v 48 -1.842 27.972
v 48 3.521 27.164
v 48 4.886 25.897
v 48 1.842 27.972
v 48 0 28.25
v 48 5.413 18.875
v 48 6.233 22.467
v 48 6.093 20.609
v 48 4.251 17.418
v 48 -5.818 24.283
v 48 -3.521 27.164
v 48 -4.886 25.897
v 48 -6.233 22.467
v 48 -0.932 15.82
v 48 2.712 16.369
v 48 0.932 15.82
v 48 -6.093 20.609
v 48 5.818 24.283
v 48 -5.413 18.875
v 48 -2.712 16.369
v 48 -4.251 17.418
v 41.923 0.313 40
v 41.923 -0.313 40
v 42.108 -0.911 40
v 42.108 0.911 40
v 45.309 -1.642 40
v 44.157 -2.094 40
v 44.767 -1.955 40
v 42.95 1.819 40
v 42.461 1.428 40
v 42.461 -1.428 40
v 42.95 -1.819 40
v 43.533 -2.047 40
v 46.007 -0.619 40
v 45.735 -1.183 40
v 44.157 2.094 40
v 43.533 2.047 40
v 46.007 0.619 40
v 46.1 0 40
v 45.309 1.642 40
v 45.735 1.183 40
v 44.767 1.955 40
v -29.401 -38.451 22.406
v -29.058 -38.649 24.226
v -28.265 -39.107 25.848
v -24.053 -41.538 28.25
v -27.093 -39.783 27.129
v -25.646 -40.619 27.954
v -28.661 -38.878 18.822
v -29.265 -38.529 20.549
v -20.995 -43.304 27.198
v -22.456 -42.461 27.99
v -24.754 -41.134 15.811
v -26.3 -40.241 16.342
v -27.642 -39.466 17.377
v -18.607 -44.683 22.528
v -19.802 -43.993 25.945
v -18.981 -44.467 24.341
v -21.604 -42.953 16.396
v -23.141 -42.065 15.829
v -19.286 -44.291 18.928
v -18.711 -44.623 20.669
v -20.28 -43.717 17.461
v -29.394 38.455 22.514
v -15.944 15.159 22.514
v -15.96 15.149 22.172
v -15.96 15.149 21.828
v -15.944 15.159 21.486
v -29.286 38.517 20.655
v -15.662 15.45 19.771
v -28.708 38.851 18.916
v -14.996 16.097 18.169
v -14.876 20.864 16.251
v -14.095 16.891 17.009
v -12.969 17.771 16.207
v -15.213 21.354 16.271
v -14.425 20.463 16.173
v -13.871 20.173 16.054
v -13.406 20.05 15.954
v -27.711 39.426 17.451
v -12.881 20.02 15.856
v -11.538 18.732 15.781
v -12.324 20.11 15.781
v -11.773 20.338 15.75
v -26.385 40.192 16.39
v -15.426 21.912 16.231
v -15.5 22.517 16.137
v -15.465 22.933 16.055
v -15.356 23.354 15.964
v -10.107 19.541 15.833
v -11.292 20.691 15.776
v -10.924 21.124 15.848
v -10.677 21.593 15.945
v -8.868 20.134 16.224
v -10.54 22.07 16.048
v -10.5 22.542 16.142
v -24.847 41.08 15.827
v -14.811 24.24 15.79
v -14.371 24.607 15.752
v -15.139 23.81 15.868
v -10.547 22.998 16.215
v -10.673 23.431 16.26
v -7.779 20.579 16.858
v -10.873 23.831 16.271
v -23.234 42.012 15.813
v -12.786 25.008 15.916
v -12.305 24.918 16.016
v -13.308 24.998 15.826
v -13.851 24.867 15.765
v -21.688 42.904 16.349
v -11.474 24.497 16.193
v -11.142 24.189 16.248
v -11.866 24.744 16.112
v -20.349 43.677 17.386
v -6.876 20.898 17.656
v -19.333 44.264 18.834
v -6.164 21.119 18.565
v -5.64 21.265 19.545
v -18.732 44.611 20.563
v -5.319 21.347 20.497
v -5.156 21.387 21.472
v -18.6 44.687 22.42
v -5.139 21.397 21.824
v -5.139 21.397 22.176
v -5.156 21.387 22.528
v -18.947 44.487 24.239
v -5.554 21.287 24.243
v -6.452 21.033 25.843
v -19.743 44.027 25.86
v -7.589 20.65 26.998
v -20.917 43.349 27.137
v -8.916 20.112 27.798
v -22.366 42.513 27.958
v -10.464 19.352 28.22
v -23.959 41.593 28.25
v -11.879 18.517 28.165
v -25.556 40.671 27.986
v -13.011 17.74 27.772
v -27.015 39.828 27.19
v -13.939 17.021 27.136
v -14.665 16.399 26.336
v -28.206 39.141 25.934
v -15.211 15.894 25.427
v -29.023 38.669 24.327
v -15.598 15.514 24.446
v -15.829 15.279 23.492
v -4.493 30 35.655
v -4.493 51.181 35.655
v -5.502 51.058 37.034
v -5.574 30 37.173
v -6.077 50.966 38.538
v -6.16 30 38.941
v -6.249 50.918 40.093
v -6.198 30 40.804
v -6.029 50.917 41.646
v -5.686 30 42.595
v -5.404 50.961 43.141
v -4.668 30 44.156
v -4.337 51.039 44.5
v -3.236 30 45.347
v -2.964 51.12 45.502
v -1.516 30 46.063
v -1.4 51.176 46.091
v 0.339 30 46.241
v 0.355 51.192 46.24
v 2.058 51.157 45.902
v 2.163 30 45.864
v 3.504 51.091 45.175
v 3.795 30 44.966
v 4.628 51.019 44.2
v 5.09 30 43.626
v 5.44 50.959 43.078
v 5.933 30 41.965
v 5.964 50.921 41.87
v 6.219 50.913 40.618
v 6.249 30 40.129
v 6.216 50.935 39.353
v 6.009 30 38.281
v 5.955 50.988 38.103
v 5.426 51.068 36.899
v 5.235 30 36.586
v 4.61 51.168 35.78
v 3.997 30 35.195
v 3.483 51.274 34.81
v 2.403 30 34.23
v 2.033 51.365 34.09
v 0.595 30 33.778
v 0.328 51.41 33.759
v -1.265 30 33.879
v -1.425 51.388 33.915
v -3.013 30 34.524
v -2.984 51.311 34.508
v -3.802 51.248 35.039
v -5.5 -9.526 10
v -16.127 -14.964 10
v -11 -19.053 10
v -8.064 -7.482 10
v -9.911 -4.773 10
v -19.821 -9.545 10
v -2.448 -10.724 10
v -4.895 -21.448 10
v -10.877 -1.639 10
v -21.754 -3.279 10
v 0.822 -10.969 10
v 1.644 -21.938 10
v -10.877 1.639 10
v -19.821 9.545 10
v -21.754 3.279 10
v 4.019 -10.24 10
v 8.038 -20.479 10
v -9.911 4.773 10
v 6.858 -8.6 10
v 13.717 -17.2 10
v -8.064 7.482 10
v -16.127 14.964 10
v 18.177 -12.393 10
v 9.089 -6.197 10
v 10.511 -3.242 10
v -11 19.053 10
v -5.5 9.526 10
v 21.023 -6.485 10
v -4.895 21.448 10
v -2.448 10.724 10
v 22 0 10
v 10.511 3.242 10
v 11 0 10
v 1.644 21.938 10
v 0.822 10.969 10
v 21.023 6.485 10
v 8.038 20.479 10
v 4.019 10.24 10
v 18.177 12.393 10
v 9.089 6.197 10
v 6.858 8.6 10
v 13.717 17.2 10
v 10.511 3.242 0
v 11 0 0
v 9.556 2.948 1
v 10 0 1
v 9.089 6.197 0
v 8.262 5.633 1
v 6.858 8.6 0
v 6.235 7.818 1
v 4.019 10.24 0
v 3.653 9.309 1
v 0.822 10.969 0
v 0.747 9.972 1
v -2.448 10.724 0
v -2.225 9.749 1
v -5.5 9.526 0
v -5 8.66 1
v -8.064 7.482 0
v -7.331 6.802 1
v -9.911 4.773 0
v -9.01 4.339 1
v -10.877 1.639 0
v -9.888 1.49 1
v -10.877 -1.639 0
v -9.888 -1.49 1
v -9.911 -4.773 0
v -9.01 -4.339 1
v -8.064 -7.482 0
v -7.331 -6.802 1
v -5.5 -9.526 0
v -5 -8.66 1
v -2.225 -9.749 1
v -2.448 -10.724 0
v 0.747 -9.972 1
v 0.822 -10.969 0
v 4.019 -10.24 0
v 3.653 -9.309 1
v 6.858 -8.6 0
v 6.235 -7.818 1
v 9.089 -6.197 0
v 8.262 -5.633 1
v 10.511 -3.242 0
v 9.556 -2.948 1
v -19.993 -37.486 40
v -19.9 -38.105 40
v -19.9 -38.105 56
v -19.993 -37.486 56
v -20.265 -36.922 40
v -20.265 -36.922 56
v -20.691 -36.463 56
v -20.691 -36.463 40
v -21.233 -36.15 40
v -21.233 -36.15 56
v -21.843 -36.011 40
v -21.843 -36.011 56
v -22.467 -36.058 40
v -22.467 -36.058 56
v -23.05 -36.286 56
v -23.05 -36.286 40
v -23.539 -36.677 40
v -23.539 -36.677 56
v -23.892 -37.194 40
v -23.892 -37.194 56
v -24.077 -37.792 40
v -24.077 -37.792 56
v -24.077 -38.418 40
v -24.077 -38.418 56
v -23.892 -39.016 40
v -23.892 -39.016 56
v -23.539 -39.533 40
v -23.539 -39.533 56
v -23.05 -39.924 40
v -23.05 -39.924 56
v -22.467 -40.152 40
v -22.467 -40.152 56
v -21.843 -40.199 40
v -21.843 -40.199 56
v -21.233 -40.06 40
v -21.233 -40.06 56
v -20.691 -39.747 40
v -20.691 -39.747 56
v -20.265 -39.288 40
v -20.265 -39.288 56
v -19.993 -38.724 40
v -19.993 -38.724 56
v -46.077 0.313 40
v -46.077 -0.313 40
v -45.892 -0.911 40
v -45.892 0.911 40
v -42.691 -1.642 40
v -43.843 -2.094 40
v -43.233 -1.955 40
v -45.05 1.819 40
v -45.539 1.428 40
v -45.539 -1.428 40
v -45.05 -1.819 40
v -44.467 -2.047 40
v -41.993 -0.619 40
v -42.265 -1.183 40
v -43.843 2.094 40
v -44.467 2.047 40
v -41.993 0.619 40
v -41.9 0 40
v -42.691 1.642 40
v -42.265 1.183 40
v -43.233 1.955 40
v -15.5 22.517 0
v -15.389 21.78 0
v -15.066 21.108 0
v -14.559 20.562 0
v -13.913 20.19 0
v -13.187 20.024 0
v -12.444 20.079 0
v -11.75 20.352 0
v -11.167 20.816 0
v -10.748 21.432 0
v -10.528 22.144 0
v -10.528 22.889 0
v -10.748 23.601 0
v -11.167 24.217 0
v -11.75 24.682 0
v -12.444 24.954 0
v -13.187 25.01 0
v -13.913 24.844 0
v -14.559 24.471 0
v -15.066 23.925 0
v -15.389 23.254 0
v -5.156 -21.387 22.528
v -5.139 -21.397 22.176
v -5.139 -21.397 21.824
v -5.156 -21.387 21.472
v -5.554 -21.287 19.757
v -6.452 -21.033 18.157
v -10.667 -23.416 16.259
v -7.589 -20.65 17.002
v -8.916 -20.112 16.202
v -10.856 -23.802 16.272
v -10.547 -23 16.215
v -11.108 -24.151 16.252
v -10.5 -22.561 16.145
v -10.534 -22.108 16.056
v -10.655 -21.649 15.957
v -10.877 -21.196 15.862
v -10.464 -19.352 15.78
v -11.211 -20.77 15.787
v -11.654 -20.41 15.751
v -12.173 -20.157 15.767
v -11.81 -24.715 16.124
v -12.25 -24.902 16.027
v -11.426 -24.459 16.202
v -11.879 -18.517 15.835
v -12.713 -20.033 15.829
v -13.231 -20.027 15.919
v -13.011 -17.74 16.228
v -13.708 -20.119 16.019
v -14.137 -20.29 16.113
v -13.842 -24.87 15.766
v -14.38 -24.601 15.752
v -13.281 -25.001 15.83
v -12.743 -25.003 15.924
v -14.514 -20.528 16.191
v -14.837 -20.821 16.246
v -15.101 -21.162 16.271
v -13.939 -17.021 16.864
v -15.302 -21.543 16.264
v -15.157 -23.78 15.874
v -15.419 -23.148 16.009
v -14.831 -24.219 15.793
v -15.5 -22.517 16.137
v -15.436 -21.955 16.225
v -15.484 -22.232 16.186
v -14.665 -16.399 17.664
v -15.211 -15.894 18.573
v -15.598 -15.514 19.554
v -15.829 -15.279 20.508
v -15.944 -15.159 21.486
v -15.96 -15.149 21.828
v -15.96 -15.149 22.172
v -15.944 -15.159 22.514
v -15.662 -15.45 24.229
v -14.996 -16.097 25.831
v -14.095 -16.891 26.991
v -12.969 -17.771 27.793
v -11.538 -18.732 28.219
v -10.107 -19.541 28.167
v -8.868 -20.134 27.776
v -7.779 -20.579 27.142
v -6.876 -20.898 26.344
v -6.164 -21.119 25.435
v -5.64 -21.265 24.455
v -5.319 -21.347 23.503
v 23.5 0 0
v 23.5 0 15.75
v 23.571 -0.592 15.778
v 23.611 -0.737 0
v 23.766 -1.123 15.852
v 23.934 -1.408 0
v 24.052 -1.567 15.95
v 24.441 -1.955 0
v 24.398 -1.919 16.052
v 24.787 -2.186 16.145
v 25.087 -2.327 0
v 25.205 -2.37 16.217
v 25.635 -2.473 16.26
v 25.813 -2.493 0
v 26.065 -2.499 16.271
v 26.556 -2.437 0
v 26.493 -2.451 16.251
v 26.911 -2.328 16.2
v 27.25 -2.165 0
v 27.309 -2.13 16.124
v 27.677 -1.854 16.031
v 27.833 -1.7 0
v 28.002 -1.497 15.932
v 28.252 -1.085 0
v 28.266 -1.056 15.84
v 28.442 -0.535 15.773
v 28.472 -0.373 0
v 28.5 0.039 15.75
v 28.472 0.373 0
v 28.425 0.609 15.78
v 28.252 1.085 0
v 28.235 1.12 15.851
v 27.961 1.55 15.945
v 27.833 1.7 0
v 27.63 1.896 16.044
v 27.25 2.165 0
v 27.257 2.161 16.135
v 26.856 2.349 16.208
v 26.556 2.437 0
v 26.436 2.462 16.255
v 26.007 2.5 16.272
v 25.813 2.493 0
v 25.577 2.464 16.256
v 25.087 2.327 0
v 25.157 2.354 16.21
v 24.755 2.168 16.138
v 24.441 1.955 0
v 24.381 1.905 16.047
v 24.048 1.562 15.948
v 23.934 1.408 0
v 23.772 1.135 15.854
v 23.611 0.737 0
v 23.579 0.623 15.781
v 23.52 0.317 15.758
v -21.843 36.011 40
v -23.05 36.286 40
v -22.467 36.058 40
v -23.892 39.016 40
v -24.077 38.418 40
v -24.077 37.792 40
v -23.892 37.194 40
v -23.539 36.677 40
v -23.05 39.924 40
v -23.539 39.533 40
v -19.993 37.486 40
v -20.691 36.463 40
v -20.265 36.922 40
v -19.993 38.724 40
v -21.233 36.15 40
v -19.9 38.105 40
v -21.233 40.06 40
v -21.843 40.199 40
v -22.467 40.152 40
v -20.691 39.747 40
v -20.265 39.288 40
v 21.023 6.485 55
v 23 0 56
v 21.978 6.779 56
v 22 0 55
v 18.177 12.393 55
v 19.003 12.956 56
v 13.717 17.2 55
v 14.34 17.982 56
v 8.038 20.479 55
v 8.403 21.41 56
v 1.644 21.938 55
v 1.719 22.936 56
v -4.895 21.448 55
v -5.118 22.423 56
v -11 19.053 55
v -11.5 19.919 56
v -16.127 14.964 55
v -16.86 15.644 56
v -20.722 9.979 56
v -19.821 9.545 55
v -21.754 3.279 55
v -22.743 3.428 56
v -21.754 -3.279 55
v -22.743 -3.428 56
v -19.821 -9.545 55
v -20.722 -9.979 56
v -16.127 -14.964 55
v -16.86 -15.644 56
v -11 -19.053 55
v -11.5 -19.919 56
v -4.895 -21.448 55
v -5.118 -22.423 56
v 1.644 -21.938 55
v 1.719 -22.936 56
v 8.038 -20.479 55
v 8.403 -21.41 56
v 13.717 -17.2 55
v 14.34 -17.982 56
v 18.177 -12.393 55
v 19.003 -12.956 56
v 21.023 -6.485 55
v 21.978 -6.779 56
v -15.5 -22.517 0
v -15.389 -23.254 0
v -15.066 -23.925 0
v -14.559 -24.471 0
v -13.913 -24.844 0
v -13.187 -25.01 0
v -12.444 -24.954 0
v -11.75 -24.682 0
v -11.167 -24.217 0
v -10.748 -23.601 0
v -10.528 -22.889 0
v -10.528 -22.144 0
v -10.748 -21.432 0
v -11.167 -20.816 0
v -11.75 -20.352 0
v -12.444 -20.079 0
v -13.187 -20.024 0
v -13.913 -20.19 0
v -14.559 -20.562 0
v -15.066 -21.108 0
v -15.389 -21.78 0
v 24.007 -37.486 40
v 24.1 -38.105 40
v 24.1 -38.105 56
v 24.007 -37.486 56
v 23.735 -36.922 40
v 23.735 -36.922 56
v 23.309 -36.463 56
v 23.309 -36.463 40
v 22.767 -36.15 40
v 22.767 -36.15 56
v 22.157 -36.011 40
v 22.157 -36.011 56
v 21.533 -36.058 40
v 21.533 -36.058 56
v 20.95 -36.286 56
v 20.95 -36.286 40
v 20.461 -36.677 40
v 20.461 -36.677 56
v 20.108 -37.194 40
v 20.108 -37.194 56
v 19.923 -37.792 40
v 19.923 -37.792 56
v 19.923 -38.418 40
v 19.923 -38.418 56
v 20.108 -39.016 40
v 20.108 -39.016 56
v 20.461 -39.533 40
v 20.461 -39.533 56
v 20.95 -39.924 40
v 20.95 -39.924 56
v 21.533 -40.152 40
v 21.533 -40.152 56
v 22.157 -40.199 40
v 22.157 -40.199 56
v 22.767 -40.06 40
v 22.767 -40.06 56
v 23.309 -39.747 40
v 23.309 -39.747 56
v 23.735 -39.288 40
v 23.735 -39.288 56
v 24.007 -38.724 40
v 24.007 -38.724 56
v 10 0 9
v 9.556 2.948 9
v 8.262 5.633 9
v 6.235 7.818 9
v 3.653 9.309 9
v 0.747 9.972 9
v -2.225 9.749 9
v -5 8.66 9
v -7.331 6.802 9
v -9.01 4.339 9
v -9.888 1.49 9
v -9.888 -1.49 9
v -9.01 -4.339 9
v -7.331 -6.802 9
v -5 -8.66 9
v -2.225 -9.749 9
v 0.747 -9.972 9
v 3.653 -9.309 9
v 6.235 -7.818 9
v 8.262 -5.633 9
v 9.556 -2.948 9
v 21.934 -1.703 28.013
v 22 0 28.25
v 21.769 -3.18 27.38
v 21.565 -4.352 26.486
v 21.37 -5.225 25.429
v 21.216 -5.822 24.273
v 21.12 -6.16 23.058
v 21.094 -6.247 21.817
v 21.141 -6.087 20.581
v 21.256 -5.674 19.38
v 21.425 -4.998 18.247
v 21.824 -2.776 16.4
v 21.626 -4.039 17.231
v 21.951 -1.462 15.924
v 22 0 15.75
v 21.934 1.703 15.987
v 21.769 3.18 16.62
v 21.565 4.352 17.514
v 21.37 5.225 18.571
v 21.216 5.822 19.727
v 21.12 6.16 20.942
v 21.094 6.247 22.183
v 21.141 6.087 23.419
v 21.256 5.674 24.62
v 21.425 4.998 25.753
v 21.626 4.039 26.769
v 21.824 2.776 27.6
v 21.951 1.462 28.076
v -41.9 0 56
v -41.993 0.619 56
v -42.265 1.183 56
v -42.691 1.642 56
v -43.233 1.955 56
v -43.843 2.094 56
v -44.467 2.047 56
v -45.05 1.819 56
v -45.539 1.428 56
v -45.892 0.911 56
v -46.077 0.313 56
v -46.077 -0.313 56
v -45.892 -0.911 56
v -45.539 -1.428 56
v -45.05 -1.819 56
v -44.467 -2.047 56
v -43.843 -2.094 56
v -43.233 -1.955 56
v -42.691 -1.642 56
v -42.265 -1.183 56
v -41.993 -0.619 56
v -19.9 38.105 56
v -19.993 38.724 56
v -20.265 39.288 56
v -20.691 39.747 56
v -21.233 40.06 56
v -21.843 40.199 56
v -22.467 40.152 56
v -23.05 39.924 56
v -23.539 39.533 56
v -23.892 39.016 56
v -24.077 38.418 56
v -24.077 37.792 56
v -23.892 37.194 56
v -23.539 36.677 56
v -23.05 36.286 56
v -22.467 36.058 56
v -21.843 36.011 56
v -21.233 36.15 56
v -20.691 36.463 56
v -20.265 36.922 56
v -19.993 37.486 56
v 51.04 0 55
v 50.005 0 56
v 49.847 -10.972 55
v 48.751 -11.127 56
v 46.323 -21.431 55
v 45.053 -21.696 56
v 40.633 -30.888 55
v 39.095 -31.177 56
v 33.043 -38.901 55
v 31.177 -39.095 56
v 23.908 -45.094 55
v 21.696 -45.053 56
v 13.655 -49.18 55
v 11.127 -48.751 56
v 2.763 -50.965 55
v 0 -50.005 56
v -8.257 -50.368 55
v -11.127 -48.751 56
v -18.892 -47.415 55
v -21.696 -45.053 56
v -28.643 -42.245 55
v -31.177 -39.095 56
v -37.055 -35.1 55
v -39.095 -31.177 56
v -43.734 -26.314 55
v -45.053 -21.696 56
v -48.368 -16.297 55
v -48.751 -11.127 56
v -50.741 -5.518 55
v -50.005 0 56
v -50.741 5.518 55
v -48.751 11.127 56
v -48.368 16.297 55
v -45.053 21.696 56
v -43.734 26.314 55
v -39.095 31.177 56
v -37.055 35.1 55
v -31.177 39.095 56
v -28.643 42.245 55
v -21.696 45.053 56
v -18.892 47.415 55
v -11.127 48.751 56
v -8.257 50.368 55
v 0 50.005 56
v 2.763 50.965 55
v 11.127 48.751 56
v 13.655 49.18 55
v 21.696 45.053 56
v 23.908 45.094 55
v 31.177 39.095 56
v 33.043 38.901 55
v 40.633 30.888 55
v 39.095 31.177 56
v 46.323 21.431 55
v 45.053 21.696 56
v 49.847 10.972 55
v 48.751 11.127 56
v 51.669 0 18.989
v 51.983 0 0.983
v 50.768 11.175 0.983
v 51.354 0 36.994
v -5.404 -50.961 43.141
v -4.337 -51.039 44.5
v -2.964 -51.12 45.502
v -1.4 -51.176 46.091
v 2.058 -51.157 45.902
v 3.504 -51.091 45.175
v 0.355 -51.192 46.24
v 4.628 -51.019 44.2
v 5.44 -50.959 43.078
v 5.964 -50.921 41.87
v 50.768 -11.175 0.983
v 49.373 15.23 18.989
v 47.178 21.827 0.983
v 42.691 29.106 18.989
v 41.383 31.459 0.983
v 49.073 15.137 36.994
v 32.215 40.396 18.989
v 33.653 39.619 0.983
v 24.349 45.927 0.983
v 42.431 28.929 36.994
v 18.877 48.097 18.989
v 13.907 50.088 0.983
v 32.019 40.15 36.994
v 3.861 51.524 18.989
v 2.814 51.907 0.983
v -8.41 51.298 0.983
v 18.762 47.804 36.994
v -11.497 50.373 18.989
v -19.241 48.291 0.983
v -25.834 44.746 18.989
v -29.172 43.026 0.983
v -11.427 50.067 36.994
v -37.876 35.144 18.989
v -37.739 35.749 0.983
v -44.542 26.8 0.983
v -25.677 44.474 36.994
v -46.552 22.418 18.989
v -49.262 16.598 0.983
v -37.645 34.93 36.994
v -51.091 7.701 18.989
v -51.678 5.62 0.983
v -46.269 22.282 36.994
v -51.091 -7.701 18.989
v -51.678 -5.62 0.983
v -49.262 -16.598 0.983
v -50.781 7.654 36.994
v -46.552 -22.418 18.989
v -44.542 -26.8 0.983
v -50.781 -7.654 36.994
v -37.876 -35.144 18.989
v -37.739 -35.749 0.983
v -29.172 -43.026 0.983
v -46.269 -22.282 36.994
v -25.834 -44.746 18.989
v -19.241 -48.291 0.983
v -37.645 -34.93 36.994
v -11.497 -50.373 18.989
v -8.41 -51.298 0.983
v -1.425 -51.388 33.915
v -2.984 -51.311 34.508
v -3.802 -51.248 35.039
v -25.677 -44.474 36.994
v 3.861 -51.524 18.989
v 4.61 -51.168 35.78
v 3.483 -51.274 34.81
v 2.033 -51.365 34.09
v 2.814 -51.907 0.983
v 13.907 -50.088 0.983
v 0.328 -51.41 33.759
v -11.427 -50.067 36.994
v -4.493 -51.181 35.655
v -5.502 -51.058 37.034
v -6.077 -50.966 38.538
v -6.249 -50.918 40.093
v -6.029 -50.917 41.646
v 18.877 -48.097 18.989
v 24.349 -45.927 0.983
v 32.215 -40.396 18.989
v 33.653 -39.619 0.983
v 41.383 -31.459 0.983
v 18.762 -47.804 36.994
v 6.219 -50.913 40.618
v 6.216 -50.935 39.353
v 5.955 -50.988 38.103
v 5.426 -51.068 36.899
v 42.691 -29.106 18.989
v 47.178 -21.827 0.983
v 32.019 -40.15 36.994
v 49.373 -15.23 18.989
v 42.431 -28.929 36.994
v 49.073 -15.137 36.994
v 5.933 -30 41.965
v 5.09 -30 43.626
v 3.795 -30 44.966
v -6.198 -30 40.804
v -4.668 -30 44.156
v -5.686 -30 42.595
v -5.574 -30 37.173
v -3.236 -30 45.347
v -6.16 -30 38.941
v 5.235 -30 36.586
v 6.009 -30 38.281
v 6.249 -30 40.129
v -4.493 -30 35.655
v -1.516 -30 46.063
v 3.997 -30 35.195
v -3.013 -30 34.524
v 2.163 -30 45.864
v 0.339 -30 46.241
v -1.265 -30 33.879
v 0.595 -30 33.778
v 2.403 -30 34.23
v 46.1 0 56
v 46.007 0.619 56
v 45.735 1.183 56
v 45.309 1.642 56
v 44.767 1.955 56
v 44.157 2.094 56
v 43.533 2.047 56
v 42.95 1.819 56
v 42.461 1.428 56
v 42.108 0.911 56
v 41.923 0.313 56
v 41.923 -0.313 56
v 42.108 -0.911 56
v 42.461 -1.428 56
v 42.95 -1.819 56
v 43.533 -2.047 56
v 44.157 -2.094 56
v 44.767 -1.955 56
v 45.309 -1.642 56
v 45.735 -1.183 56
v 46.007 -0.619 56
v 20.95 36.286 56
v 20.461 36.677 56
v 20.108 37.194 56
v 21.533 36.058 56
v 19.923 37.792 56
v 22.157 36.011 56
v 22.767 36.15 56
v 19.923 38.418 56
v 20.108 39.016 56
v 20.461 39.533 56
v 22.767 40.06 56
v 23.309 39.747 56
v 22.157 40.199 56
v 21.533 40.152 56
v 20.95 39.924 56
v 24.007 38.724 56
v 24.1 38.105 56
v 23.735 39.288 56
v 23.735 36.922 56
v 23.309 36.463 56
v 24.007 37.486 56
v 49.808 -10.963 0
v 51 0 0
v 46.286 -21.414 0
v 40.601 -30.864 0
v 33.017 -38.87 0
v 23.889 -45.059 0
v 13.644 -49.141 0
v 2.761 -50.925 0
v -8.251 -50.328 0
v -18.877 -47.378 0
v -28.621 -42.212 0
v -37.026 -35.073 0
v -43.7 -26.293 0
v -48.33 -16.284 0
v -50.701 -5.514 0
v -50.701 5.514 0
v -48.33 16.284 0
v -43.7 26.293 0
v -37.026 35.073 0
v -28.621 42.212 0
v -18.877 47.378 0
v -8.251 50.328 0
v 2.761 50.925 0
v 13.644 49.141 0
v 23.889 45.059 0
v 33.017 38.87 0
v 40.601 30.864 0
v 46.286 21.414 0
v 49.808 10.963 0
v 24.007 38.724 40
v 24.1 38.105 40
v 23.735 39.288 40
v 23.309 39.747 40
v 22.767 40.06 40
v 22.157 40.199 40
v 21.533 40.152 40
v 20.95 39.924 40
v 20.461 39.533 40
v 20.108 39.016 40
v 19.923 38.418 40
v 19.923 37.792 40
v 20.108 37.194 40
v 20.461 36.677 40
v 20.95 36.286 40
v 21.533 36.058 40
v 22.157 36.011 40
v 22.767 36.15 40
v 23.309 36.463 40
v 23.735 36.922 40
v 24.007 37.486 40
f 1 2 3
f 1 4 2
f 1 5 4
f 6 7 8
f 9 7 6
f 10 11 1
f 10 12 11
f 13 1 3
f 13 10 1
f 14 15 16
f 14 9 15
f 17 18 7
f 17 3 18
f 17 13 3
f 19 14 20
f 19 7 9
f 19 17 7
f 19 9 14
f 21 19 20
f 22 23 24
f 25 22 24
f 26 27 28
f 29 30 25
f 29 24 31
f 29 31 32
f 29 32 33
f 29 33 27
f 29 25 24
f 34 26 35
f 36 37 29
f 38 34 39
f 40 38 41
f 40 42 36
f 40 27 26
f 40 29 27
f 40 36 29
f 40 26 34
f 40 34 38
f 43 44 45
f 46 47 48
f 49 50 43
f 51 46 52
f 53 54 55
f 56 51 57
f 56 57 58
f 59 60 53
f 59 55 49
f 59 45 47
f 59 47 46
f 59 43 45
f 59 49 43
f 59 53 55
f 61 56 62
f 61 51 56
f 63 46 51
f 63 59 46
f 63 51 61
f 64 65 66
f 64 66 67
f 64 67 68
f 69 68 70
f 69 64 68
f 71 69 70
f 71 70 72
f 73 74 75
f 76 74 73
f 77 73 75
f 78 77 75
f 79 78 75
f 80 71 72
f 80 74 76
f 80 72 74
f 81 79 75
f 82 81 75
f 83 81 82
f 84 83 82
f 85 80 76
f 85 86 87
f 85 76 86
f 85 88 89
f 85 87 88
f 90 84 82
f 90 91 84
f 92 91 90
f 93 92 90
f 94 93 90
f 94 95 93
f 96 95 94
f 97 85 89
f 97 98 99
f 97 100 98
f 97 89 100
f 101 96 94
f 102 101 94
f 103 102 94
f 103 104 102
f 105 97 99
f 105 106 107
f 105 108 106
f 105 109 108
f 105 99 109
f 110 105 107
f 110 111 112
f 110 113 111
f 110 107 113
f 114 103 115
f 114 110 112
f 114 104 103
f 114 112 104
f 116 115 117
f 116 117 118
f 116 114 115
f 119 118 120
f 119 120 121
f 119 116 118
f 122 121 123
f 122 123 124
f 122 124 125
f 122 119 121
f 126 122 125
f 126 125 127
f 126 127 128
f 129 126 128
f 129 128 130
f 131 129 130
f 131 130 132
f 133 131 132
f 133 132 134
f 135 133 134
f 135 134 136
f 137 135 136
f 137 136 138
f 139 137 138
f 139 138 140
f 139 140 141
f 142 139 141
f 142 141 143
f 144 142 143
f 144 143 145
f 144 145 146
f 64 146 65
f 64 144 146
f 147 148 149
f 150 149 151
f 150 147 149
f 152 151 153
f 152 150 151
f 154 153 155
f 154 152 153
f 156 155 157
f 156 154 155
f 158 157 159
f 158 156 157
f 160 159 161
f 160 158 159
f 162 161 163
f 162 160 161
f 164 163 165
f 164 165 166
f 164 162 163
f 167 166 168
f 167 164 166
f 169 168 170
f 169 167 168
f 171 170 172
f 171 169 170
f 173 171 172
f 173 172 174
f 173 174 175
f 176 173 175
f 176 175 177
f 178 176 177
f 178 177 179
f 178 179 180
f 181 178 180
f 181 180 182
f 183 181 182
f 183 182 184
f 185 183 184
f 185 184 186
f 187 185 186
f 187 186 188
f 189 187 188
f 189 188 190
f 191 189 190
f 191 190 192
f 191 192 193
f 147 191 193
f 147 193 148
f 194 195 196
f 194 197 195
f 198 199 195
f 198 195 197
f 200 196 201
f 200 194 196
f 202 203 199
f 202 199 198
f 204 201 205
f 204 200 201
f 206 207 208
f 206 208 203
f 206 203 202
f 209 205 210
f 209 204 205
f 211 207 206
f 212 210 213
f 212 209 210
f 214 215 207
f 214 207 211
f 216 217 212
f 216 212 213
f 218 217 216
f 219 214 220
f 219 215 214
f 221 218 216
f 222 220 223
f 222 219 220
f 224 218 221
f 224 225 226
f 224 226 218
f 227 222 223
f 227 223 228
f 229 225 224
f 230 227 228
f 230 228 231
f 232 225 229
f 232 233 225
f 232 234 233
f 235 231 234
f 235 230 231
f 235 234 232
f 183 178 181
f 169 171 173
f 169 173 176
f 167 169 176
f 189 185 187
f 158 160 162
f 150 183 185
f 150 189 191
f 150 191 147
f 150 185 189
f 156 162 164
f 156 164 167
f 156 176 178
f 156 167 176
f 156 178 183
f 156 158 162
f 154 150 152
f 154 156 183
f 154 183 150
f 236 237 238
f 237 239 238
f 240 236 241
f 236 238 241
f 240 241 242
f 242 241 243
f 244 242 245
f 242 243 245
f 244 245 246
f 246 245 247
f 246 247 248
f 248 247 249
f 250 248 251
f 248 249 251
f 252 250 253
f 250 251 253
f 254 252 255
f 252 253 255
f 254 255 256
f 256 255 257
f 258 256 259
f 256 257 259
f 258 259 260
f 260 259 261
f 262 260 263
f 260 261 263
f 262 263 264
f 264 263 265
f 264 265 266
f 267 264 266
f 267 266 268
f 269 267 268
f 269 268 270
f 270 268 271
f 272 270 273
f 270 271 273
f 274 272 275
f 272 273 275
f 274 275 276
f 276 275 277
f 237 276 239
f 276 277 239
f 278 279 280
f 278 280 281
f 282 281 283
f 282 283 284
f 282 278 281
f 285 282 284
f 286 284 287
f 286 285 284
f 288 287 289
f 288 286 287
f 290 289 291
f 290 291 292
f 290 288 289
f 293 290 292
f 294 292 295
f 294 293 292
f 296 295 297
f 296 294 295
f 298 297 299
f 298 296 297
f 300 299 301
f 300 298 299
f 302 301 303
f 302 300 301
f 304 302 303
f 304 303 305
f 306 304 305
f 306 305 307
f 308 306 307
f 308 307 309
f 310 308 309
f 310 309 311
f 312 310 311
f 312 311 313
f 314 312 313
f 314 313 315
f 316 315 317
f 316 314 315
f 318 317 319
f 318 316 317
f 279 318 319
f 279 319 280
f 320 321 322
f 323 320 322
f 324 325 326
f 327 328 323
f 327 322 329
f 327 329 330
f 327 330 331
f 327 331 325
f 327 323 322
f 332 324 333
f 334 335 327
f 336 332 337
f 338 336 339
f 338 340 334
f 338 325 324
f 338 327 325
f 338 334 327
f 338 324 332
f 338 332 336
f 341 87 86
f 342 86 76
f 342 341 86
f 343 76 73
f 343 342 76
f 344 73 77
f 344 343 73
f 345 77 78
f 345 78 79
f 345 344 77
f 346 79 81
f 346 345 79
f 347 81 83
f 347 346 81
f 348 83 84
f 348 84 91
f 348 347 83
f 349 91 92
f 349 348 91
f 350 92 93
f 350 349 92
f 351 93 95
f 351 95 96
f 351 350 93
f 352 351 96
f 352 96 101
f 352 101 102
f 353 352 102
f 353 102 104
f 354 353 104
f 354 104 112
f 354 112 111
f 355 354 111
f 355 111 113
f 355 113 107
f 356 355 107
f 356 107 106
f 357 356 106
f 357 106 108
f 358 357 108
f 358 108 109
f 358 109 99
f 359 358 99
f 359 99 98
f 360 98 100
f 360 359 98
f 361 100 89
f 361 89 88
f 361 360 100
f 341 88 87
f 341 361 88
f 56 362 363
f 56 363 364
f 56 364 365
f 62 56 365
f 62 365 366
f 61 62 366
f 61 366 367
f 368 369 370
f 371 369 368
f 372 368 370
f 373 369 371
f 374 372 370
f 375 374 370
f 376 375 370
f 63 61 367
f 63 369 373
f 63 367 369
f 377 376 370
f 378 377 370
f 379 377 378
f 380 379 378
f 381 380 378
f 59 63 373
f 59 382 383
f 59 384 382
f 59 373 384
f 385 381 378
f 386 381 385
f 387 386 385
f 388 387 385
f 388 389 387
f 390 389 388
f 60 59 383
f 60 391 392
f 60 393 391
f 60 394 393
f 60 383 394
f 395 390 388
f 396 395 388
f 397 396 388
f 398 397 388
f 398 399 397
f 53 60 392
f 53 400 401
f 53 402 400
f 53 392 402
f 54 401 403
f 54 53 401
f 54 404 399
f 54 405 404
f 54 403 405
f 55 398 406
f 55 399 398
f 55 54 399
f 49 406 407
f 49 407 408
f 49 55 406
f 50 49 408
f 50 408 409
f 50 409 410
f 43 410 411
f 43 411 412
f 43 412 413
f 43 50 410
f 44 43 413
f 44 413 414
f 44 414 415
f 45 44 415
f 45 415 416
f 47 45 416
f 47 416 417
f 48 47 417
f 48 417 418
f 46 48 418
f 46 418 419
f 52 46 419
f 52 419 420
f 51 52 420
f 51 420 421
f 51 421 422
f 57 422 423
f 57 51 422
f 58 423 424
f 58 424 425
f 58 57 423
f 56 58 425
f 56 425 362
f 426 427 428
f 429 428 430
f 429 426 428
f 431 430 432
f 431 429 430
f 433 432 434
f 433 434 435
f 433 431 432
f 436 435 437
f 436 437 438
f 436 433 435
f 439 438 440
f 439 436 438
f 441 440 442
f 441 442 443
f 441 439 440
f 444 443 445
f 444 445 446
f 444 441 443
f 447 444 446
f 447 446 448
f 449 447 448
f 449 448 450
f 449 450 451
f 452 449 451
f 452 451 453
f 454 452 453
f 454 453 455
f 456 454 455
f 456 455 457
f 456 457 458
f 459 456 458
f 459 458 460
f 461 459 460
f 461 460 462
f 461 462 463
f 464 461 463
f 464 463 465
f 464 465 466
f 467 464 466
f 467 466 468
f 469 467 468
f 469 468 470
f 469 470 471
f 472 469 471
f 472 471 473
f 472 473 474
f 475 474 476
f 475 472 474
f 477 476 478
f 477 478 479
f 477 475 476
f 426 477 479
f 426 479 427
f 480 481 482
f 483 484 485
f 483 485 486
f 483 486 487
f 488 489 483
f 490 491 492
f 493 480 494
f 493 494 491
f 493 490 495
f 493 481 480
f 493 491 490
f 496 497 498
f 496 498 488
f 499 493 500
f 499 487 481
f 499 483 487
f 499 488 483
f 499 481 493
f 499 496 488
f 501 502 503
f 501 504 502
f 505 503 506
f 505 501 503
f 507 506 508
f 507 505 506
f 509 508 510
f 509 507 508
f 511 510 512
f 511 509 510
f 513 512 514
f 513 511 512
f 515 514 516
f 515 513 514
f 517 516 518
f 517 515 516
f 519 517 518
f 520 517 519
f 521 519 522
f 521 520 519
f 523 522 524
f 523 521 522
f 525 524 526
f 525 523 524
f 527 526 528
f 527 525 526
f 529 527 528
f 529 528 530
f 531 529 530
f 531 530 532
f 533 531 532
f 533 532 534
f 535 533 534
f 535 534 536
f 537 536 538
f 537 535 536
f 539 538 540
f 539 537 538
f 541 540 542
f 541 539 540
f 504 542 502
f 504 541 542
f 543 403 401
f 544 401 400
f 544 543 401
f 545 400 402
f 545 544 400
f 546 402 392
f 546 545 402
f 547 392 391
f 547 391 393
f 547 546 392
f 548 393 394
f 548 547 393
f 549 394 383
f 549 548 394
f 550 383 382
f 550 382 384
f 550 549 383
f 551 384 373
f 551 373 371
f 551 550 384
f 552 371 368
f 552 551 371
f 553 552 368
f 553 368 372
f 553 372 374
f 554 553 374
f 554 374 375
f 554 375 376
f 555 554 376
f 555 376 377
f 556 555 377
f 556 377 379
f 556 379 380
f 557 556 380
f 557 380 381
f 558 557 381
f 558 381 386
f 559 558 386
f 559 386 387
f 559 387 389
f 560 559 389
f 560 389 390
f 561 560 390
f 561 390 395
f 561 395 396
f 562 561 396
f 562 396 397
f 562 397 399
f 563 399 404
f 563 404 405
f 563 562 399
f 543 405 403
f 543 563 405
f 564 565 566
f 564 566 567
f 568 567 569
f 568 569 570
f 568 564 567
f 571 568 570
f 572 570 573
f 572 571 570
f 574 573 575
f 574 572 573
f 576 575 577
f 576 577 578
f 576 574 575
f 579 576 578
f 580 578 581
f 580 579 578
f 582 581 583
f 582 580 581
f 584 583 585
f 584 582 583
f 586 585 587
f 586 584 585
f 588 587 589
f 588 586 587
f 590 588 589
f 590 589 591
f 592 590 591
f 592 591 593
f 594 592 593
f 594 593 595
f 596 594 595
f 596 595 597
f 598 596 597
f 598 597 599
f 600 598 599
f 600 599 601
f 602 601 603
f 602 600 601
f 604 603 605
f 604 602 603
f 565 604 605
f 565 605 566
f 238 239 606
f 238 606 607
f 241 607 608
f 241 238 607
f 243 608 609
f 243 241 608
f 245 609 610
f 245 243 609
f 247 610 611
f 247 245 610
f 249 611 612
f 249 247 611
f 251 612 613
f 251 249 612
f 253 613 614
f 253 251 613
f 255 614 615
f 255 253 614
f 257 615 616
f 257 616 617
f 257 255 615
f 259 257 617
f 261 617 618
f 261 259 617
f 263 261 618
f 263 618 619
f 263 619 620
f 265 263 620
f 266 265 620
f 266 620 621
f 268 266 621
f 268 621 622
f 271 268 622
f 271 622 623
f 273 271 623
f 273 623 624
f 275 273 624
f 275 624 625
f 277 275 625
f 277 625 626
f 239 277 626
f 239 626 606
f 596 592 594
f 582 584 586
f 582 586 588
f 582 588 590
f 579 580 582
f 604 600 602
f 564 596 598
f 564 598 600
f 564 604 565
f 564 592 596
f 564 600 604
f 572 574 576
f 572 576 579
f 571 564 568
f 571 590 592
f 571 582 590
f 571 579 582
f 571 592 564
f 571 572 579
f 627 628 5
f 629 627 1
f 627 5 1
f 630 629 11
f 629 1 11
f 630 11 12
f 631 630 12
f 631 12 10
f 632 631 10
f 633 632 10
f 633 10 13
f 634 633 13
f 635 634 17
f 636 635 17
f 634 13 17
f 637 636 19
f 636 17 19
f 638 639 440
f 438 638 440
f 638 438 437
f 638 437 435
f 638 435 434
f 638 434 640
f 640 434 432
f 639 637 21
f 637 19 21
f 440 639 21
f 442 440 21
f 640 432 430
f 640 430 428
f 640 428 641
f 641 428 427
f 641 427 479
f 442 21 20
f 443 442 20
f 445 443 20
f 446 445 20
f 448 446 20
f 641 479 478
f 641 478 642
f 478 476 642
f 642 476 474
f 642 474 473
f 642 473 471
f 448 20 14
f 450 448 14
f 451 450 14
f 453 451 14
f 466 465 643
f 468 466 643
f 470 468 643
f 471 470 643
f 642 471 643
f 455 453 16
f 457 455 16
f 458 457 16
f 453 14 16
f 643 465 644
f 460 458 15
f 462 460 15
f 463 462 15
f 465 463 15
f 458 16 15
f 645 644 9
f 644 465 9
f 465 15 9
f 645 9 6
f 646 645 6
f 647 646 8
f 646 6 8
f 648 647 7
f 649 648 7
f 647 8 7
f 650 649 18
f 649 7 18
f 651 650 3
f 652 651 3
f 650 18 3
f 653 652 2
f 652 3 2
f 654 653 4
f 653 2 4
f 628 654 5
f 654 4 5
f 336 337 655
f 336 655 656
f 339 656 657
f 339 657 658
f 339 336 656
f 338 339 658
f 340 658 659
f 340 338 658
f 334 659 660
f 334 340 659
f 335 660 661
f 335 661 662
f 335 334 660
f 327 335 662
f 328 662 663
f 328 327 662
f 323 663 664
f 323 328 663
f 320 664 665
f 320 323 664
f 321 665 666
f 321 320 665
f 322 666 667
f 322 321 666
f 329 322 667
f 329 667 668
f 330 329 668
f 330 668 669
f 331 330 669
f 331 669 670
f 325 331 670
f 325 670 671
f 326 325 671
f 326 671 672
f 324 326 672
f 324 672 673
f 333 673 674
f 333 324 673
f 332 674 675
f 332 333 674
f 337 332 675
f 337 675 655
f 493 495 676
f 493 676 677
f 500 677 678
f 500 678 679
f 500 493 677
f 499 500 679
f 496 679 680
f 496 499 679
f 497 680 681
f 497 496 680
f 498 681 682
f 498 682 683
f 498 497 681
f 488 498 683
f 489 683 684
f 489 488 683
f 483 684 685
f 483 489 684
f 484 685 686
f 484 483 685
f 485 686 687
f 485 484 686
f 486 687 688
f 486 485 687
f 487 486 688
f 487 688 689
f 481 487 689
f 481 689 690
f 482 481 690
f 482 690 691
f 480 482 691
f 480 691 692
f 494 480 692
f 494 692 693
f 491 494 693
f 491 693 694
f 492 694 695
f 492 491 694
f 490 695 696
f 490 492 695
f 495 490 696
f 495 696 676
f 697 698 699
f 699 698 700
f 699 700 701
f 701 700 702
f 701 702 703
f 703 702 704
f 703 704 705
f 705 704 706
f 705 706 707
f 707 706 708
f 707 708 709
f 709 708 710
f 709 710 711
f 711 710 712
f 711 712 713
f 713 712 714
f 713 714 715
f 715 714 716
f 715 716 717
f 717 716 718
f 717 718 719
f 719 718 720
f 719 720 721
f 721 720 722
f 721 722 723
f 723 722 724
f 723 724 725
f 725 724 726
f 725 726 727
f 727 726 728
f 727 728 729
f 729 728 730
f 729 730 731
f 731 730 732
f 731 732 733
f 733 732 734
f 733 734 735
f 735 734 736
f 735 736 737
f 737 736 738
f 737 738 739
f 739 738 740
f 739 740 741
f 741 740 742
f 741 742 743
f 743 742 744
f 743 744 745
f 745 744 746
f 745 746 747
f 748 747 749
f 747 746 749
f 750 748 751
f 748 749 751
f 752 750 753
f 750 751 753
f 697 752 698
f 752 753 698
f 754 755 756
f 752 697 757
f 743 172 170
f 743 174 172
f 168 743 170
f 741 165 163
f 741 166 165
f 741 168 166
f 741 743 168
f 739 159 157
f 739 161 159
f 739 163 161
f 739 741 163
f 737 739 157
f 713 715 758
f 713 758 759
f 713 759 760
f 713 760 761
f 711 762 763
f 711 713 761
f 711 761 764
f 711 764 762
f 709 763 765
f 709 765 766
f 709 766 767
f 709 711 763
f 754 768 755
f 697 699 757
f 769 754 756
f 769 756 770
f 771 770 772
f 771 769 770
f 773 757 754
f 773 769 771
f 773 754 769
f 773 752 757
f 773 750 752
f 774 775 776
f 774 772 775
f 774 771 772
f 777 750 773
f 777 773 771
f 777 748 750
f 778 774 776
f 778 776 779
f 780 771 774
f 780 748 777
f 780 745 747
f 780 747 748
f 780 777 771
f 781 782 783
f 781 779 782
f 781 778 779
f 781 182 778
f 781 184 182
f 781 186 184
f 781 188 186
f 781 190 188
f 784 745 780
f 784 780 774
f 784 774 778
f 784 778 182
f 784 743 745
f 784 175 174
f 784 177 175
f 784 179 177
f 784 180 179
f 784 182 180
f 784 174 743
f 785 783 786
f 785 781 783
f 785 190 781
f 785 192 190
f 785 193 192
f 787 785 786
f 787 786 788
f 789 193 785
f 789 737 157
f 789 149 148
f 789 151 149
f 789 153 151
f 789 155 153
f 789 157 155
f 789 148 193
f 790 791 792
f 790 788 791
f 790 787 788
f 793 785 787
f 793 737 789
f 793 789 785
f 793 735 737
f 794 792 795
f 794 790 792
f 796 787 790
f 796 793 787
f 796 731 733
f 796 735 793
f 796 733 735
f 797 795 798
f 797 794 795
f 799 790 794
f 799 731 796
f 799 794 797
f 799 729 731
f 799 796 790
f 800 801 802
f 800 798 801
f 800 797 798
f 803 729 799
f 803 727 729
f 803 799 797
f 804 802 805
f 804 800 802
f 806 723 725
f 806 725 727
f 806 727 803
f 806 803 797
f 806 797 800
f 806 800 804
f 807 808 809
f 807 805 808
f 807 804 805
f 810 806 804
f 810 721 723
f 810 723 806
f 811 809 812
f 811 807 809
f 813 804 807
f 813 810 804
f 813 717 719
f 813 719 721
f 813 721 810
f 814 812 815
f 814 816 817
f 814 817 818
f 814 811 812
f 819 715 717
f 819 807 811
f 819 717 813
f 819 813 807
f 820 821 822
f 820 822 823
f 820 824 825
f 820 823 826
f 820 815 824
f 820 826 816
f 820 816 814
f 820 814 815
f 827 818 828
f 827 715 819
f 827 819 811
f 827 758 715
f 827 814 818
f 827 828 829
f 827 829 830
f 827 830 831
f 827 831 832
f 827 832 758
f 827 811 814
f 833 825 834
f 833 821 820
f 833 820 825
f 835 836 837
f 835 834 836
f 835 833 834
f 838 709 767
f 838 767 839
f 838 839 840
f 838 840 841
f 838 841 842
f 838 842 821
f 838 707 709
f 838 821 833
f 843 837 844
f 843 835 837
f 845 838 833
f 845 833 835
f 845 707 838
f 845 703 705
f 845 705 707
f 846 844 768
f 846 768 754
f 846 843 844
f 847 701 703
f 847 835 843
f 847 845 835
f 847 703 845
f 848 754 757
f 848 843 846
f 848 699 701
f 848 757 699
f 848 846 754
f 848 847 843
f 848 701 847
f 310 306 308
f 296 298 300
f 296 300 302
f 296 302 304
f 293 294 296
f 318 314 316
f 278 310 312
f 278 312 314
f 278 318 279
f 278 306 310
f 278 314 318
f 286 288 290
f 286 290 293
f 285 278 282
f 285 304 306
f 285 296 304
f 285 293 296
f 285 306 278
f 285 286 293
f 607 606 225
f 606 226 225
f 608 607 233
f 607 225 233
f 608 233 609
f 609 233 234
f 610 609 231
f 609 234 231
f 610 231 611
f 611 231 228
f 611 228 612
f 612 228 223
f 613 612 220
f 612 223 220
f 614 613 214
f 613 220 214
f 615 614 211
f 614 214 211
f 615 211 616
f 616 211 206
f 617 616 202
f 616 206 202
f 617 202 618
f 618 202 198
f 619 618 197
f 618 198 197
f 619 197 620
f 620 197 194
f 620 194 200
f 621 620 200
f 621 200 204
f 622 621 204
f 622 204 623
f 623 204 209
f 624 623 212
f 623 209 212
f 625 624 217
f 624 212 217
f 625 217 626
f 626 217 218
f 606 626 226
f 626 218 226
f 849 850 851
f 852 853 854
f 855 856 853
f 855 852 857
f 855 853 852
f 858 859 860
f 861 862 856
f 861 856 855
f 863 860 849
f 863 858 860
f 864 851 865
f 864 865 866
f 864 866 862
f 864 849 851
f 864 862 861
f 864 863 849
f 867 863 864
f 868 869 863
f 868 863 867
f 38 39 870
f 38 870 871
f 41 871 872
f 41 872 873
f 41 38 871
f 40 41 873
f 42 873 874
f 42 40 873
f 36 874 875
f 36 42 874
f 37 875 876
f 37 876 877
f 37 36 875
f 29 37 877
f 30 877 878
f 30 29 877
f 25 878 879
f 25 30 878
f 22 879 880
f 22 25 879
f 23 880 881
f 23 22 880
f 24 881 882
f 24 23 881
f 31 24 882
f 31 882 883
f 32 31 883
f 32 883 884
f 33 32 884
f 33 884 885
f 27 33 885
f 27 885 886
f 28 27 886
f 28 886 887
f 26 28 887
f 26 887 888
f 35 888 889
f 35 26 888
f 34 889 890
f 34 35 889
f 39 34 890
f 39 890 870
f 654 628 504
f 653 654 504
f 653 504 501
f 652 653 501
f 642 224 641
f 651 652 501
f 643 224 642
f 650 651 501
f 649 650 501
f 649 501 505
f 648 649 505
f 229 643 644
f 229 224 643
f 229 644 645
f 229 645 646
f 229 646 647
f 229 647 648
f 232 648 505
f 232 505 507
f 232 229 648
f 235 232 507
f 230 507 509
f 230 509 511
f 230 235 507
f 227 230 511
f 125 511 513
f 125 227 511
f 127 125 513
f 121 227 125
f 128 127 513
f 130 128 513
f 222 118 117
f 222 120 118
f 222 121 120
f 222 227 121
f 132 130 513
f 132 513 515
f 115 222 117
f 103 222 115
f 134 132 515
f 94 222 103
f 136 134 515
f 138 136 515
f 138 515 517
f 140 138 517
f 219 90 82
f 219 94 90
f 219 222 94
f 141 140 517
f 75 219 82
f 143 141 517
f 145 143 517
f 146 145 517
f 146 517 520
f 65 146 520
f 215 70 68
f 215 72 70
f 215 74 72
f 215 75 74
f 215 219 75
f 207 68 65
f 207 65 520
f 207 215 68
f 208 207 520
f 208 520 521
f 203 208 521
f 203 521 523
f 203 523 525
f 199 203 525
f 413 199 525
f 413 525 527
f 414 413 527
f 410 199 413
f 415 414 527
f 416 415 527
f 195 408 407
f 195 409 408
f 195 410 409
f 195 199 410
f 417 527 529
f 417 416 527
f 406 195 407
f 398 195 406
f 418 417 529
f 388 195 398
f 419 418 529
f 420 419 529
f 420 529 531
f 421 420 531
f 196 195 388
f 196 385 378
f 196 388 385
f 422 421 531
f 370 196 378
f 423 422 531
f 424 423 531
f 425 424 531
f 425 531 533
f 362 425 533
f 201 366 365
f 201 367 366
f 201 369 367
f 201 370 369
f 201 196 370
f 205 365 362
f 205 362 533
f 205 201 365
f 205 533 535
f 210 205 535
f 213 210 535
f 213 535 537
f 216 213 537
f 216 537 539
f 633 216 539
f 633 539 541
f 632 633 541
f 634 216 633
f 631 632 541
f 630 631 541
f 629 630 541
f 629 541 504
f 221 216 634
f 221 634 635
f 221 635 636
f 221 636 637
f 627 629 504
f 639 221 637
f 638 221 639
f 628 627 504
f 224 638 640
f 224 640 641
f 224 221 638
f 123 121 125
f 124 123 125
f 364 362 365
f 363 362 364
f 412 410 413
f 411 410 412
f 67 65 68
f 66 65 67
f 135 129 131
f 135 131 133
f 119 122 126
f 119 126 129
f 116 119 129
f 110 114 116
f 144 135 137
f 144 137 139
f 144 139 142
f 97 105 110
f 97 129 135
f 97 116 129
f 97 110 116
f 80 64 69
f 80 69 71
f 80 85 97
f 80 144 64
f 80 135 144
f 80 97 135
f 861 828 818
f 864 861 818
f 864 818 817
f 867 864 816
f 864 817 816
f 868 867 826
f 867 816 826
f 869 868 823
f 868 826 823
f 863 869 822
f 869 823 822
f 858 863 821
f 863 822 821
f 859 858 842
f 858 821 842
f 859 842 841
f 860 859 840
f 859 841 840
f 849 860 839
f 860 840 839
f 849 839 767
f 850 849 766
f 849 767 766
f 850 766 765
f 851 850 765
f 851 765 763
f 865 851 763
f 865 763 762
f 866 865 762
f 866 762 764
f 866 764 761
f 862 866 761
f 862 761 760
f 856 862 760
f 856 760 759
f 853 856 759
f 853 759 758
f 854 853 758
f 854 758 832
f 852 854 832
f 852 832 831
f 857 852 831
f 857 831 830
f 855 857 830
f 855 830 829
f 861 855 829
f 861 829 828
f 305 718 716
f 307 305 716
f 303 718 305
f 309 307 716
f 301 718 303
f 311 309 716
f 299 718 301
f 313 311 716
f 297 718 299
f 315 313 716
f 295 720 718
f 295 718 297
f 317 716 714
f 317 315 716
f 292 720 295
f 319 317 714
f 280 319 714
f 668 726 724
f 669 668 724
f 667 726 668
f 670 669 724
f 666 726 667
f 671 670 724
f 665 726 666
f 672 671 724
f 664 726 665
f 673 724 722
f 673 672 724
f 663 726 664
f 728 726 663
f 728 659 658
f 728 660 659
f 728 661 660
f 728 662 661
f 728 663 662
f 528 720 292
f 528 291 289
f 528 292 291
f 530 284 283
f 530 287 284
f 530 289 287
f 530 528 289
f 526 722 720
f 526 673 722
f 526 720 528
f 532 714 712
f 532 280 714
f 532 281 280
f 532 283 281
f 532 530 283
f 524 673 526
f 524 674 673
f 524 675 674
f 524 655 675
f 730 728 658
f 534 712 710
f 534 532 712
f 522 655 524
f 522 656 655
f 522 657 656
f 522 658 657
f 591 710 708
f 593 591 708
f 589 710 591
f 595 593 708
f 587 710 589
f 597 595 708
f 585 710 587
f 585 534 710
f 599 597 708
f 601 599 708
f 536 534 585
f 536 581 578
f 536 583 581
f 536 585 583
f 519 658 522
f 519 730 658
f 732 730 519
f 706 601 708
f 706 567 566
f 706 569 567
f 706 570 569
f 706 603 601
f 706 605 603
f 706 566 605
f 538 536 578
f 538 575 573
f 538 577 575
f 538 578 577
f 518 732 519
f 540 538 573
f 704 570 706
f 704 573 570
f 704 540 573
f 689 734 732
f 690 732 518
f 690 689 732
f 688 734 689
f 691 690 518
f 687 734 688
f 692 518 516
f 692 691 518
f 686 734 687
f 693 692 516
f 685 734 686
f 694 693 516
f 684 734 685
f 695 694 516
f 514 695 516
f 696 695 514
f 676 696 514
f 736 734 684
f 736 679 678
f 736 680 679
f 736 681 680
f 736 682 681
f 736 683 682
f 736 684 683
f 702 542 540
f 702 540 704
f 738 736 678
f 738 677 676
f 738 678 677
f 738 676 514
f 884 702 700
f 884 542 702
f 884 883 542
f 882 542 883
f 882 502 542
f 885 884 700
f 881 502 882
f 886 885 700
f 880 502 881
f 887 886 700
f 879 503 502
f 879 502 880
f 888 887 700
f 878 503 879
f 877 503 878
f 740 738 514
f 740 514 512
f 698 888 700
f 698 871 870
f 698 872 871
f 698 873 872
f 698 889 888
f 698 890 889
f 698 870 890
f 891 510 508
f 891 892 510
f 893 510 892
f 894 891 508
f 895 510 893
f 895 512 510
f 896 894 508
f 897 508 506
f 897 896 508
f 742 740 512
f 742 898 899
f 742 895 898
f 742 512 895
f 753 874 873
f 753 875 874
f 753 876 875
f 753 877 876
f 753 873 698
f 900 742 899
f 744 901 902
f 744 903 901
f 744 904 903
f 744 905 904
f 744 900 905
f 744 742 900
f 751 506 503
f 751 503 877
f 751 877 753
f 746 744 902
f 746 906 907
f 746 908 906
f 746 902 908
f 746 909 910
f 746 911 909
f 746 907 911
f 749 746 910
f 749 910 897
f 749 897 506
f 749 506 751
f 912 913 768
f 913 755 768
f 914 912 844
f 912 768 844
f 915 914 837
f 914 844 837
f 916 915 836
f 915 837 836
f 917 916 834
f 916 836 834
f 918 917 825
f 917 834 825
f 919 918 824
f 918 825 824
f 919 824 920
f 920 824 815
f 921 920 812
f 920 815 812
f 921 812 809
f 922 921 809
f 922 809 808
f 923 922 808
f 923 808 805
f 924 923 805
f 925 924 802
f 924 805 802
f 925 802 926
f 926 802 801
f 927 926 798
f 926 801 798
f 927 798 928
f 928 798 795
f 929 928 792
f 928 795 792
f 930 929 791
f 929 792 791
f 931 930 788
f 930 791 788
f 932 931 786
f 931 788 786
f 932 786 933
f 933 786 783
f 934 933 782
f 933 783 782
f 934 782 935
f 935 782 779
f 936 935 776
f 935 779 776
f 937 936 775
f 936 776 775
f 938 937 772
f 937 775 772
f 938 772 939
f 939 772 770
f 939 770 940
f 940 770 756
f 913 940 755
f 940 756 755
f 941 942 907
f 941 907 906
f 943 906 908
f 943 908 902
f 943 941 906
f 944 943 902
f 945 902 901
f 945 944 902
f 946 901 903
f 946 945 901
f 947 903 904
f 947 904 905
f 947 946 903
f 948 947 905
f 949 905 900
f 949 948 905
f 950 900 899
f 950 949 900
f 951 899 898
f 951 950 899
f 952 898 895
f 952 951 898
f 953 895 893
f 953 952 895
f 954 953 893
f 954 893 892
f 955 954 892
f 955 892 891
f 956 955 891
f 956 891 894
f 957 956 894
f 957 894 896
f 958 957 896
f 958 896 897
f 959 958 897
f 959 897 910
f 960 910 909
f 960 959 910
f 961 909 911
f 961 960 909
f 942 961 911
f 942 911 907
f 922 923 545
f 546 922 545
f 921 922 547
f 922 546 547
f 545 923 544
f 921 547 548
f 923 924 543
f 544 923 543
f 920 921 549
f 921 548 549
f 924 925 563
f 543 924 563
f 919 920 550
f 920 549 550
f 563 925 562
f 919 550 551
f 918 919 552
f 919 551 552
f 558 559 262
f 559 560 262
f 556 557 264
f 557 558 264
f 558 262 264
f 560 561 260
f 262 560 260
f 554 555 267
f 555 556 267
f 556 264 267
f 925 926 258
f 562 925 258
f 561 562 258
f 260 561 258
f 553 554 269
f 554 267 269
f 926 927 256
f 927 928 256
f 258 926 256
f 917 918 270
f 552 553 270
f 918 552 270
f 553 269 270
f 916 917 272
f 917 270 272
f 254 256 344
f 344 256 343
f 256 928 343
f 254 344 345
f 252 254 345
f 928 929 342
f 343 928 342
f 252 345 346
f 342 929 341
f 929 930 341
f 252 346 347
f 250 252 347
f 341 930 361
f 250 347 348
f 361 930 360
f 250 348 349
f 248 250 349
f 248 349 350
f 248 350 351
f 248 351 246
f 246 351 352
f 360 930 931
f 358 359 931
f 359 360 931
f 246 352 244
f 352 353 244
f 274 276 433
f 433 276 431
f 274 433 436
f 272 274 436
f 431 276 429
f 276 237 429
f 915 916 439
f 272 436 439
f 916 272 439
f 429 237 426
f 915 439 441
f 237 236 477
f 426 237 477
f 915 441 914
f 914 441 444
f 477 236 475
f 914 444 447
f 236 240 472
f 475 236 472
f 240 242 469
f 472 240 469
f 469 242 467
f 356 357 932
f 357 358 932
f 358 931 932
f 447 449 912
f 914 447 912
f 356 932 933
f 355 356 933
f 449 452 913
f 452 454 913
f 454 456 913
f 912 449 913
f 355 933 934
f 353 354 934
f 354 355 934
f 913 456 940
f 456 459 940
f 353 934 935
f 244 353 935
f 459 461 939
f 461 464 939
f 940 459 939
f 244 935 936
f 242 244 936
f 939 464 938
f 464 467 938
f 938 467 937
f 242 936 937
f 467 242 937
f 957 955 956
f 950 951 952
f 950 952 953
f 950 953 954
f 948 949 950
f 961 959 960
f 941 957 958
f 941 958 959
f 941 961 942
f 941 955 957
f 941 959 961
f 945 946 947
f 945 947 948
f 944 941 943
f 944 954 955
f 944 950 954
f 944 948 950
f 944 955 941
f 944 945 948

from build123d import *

# Parameters (mm, degrees)
SK_BODY_R          = 52
BODY_DRAFT1_DEPTH  = 56
BODY_DRAFT1_TAPER  = 1
SK_B20_R           = 10
CUT_B20_DEPTH      = 10
SK_PL0_W           = 27
SK_PL0_H           = 6.25
SK_CAV2_R          = 22
CUT_CAV44B_DEPTH   = 46
CUT_NOTCH120_DEPTH = 2
SK_H120_R          = 6.25
CUT_PL120C_DEPTH   = 26.9
CUT_NOTCH240_DEPTH = 2
SK_H240_R          = 6.25
CUT_PL240C_DEPTH   = 26.9
SK_P5_R            = 2.5
CUT_P5X3_DEPTH     = 22
CHAMFER_C1_SIZE    = 1
CHAMFER_C1_SIZE_2  = 0.982994102
CHAMFER_C1_SIZE_3  = 1.017920191
SK_M5V12_R         = 2.1
CUT_M5V12_DEPTH    = 16
SK_NOTCH90_W       = 2
SK_NOTCH90_H       = 0.8
CUT_NOTCH90_DEPTH  = 2
SK_OIL90_R         = 6.25
CUT_OIL90_DEPTH    = 22
SK_NOTCH270_W      = 2
SK_NOTCH270_H      = 0.8
CUT_NOTCH270_DEPTH = 2
CUT_OIL270_START   = 22
SK_OIL270_R        = 6.25
CUT_OIL270_DEPTH   = 22


with BuildPart() as part:
    # Sk_body → Body_draft1 (new body)
    with BuildSketch(Plane.XY):
        Circle(SK_BODY_R)
    extrude(amount=BODY_DRAFT1_DEPTH, taper=BODY_DRAFT1_TAPER)

    # Sk_b20 → Cut_b20 (cut)
    with BuildSketch(Plane.XY):
        Circle(SK_B20_R)
    extrude(amount=CUT_B20_DEPTH, mode=Mode.SUBTRACT)

    # Sk_pl0 → Cut_pl0 (revolve, cut)
    with BuildSketch(Plane.XY.offset(22), mode=Mode.PRIVATE) as cut_pl0_sk:
        with Locations((34.5, 3.125)):
            Rectangle(SK_PL0_W, SK_PL0_H)
    revolve(cut_pl0_sk.sketch.rotate(Axis((0, 0, 22), (1, 0, 0)), 90), axis=Axis((0, 0, 22), (1, 0, 0)), mode=Mode.SUBTRACT)

    # Sk_cav2 → Cut_cav44b (cut)
    with BuildSketch(Plane.XY.offset(10)):
        Circle(SK_CAV2_R)
    extrude(amount=CUT_CAV44B_DEPTH, mode=Mode.SUBTRACT)

    # Sk_notch120 → Cut_notch120 (cut)
    with BuildSketch(Plane.XY.offset(21)):
        Polygon((-24.466, 40.3764), (-22.734, 41.3764), (-23.134, 42.0692), (-24.866, 41.0692), align=None)
    extrude(amount=CUT_NOTCH120_DEPTH, mode=Mode.SUBTRACT)

    # Sk_h120 → Cut_pl120c (cut)
    with BuildSketch(Plane(origin=(-24.000519623, 41.568899987, 0), x_dir=(0.8660190526287386, 0.5000110003630143, 0), z_dir=(0.5000110003630142, -0.8660190526287385, 0))):
        with Locations(Location((0.000600013, 22, 0), (0, 0, 175.281583596))):
            Circle(SK_H120_R)
    extrude(amount=CUT_PL120C_DEPTH, mode=Mode.SUBTRACT)

    # Sk_notch240 → Cut_notch240 (cut)
    with BuildSketch(Plane.XY.offset(21)):
        Polygon((-22.734, -41.3764), (-24.466, -40.3764), (-24.866, -41.0692), (-23.134, -42.0692), align=None)
    extrude(amount=CUT_NOTCH240_DEPTH, mode=Mode.SUBTRACT)

    # Sk_h240 → Cut_pl240c (cut)
    with BuildSketch(Plane(origin=(-24.000519623, -41.568899987, 0), x_dir=(0.8660190526287386, -0.5000110003630143, 0), z_dir=(0.5000110003630142, 0.8660190526287385, 0))):
        with Locations(Location((0.000600013, -22, 0), (0, 0, 355.149686071))):
            Circle(SK_H240_R)
    extrude(amount=CUT_PL240C_DEPTH, mode=Mode.SUBTRACT)

    # Sk_p5 → Cut_p5x3 (cut)
    with BuildSketch(Plane.XY):
        with Locations(Location((26, 0, 0), (0, 0, 180))):
            Circle(SK_P5_R)
        with Locations(Location((-13, 22.5167, 0), (0, 0, 180))):
            Circle(SK_P5_R)
        with Locations(Location((-13, -22.5167, 0), (0, 0, 180))):
            Circle(SK_P5_R)
    extrude(amount=CUT_P5X3_DEPTH, mode=Mode.SUBTRACT)

    # Chamfer_C1
    # the kernel refuses this chamfer: 1.017920191, 1, 0.982994102 mm, written as the material it takes off along each edge
    with BuildSketch(Plane(origin=(0, 0, 56), x_dir=(1, 0, 0), z_dir=(0, -1, 0))) as chamfer_c1_piece_1:
        Polygon((22 + CHAMFER_C1_SIZE, 0), (22, -CHAMFER_C1_SIZE), (22, 0), align=None)
    revolve(axis=Axis((0, 0, 56), (0, 0, 1)), mode=Mode.SUBTRACT)
    with BuildSketch(Plane(origin=(0, 0, 10), x_dir=(1, 0, 0), z_dir=(0, -1, 0))) as chamfer_c1_piece_2:
        Polygon((10, -CHAMFER_C1_SIZE), (10 + CHAMFER_C1_SIZE, 0), (10, 0), align=None)
    revolve(axis=Axis((0, 0, 10), (0, 0, 1)), mode=Mode.SUBTRACT)
    with BuildSketch(Plane(origin=(0, 0, 0), x_dir=(1, 0, 0), z_dir=(0, -1, 0))) as chamfer_c1_piece_3:
        Polygon((10 + CHAMFER_C1_SIZE, 0), (10, CHAMFER_C1_SIZE), (10, 0), align=None)
    revolve(axis=Axis((0, 0, 0), (0, 0, 1)), mode=Mode.SUBTRACT)
    with BuildSketch(Plane(origin=(0, 0, 0), x_dir=(1, 0, 0), z_dir=(0, 1, 0))) as chamfer_c1_piece_4:
        Polygon((52 - CHAMFER_C1_SIZE, 0), (52 - CHAMFER_C1_SIZE_2 * 0.0174524064402, -CHAMFER_C1_SIZE_2 * 0.999847695326), (52, 0), align=None)
    revolve(axis=Axis((0, 0, 0), (0, 0, -1)), mode=Mode.SUBTRACT)
    with BuildSketch(Plane(origin=(0, 0, 56), x_dir=(1, 0, 0), z_dir=(0, 1, 0))) as chamfer_c1_piece_5:
        Polygon((51.022516364 + CHAMFER_C1_SIZE * 0.0174524064373, CHAMFER_C1_SIZE * 0.999847695156), (51.022516364 - CHAMFER_C1_SIZE_3, 0), (51.022516364, 0), align=None)
    revolve(axis=Axis((0, 0, 56), (0, 0, -1)), mode=Mode.SUBTRACT)

    # Sk_m5v12 → Cut_m5v12 (cut)
    with BuildSketch(Plane.XY.offset(40)):
        with Locations((44, 0)):
            Circle(SK_M5V12_R)
        with Locations((22, 38.1051)):
            Circle(SK_M5V12_R)
        with Locations((-22, 38.1051)):
            Circle(SK_M5V12_R)
        with Locations((-44, 0)):
            Circle(SK_M5V12_R)
        with Locations((-22, -38.1051)):
            Circle(SK_M5V12_R)
        with Locations((22, -38.1051)):
            Circle(SK_M5V12_R)
    extrude(amount=CUT_M5V12_DEPTH, mode=Mode.SUBTRACT)

    # Sk_notch90 → Cut_notch90 (cut)
    with BuildSketch(Plane.XY.offset(39)):
        with Locations((0, 30.4)):
            Rectangle(SK_NOTCH90_W, SK_NOTCH90_H)
    extrude(amount=CUT_NOTCH90_DEPTH, mode=Mode.SUBTRACT)

    # Sk_oil90 → Cut_oil90 (cut)
    with BuildSketch(Plane(origin=(0, 30, 0), x_dir=(1, 0, 0), z_dir=(0, 1, 0))):
        with Locations(Location((0, -40, 0), (0, 0, 135.962349207))):
            Circle(SK_OIL90_R)
    extrude(amount=CUT_OIL90_DEPTH, mode=Mode.SUBTRACT)

    # Sk_notch270 → Cut_notch270 (cut)
    with BuildSketch(Plane.XY.offset(39)):
        with Locations((0, -30.4)):
            Rectangle(SK_NOTCH270_W, SK_NOTCH270_H)
    extrude(amount=CUT_NOTCH270_DEPTH, mode=Mode.SUBTRACT)

    # Sk_oil270 → Cut_oil270 (cut)
    with BuildSketch(Plane.XZ.offset(30).offset(CUT_OIL270_START)):
        with Locations(Location((0, 40, 0), (0, 0, 224.037650793))):
            Circle(SK_OIL270_R)
    extrude(amount=-CUT_OIL270_DEPTH, mode=Mode.SUBTRACT)


solid = part.part
